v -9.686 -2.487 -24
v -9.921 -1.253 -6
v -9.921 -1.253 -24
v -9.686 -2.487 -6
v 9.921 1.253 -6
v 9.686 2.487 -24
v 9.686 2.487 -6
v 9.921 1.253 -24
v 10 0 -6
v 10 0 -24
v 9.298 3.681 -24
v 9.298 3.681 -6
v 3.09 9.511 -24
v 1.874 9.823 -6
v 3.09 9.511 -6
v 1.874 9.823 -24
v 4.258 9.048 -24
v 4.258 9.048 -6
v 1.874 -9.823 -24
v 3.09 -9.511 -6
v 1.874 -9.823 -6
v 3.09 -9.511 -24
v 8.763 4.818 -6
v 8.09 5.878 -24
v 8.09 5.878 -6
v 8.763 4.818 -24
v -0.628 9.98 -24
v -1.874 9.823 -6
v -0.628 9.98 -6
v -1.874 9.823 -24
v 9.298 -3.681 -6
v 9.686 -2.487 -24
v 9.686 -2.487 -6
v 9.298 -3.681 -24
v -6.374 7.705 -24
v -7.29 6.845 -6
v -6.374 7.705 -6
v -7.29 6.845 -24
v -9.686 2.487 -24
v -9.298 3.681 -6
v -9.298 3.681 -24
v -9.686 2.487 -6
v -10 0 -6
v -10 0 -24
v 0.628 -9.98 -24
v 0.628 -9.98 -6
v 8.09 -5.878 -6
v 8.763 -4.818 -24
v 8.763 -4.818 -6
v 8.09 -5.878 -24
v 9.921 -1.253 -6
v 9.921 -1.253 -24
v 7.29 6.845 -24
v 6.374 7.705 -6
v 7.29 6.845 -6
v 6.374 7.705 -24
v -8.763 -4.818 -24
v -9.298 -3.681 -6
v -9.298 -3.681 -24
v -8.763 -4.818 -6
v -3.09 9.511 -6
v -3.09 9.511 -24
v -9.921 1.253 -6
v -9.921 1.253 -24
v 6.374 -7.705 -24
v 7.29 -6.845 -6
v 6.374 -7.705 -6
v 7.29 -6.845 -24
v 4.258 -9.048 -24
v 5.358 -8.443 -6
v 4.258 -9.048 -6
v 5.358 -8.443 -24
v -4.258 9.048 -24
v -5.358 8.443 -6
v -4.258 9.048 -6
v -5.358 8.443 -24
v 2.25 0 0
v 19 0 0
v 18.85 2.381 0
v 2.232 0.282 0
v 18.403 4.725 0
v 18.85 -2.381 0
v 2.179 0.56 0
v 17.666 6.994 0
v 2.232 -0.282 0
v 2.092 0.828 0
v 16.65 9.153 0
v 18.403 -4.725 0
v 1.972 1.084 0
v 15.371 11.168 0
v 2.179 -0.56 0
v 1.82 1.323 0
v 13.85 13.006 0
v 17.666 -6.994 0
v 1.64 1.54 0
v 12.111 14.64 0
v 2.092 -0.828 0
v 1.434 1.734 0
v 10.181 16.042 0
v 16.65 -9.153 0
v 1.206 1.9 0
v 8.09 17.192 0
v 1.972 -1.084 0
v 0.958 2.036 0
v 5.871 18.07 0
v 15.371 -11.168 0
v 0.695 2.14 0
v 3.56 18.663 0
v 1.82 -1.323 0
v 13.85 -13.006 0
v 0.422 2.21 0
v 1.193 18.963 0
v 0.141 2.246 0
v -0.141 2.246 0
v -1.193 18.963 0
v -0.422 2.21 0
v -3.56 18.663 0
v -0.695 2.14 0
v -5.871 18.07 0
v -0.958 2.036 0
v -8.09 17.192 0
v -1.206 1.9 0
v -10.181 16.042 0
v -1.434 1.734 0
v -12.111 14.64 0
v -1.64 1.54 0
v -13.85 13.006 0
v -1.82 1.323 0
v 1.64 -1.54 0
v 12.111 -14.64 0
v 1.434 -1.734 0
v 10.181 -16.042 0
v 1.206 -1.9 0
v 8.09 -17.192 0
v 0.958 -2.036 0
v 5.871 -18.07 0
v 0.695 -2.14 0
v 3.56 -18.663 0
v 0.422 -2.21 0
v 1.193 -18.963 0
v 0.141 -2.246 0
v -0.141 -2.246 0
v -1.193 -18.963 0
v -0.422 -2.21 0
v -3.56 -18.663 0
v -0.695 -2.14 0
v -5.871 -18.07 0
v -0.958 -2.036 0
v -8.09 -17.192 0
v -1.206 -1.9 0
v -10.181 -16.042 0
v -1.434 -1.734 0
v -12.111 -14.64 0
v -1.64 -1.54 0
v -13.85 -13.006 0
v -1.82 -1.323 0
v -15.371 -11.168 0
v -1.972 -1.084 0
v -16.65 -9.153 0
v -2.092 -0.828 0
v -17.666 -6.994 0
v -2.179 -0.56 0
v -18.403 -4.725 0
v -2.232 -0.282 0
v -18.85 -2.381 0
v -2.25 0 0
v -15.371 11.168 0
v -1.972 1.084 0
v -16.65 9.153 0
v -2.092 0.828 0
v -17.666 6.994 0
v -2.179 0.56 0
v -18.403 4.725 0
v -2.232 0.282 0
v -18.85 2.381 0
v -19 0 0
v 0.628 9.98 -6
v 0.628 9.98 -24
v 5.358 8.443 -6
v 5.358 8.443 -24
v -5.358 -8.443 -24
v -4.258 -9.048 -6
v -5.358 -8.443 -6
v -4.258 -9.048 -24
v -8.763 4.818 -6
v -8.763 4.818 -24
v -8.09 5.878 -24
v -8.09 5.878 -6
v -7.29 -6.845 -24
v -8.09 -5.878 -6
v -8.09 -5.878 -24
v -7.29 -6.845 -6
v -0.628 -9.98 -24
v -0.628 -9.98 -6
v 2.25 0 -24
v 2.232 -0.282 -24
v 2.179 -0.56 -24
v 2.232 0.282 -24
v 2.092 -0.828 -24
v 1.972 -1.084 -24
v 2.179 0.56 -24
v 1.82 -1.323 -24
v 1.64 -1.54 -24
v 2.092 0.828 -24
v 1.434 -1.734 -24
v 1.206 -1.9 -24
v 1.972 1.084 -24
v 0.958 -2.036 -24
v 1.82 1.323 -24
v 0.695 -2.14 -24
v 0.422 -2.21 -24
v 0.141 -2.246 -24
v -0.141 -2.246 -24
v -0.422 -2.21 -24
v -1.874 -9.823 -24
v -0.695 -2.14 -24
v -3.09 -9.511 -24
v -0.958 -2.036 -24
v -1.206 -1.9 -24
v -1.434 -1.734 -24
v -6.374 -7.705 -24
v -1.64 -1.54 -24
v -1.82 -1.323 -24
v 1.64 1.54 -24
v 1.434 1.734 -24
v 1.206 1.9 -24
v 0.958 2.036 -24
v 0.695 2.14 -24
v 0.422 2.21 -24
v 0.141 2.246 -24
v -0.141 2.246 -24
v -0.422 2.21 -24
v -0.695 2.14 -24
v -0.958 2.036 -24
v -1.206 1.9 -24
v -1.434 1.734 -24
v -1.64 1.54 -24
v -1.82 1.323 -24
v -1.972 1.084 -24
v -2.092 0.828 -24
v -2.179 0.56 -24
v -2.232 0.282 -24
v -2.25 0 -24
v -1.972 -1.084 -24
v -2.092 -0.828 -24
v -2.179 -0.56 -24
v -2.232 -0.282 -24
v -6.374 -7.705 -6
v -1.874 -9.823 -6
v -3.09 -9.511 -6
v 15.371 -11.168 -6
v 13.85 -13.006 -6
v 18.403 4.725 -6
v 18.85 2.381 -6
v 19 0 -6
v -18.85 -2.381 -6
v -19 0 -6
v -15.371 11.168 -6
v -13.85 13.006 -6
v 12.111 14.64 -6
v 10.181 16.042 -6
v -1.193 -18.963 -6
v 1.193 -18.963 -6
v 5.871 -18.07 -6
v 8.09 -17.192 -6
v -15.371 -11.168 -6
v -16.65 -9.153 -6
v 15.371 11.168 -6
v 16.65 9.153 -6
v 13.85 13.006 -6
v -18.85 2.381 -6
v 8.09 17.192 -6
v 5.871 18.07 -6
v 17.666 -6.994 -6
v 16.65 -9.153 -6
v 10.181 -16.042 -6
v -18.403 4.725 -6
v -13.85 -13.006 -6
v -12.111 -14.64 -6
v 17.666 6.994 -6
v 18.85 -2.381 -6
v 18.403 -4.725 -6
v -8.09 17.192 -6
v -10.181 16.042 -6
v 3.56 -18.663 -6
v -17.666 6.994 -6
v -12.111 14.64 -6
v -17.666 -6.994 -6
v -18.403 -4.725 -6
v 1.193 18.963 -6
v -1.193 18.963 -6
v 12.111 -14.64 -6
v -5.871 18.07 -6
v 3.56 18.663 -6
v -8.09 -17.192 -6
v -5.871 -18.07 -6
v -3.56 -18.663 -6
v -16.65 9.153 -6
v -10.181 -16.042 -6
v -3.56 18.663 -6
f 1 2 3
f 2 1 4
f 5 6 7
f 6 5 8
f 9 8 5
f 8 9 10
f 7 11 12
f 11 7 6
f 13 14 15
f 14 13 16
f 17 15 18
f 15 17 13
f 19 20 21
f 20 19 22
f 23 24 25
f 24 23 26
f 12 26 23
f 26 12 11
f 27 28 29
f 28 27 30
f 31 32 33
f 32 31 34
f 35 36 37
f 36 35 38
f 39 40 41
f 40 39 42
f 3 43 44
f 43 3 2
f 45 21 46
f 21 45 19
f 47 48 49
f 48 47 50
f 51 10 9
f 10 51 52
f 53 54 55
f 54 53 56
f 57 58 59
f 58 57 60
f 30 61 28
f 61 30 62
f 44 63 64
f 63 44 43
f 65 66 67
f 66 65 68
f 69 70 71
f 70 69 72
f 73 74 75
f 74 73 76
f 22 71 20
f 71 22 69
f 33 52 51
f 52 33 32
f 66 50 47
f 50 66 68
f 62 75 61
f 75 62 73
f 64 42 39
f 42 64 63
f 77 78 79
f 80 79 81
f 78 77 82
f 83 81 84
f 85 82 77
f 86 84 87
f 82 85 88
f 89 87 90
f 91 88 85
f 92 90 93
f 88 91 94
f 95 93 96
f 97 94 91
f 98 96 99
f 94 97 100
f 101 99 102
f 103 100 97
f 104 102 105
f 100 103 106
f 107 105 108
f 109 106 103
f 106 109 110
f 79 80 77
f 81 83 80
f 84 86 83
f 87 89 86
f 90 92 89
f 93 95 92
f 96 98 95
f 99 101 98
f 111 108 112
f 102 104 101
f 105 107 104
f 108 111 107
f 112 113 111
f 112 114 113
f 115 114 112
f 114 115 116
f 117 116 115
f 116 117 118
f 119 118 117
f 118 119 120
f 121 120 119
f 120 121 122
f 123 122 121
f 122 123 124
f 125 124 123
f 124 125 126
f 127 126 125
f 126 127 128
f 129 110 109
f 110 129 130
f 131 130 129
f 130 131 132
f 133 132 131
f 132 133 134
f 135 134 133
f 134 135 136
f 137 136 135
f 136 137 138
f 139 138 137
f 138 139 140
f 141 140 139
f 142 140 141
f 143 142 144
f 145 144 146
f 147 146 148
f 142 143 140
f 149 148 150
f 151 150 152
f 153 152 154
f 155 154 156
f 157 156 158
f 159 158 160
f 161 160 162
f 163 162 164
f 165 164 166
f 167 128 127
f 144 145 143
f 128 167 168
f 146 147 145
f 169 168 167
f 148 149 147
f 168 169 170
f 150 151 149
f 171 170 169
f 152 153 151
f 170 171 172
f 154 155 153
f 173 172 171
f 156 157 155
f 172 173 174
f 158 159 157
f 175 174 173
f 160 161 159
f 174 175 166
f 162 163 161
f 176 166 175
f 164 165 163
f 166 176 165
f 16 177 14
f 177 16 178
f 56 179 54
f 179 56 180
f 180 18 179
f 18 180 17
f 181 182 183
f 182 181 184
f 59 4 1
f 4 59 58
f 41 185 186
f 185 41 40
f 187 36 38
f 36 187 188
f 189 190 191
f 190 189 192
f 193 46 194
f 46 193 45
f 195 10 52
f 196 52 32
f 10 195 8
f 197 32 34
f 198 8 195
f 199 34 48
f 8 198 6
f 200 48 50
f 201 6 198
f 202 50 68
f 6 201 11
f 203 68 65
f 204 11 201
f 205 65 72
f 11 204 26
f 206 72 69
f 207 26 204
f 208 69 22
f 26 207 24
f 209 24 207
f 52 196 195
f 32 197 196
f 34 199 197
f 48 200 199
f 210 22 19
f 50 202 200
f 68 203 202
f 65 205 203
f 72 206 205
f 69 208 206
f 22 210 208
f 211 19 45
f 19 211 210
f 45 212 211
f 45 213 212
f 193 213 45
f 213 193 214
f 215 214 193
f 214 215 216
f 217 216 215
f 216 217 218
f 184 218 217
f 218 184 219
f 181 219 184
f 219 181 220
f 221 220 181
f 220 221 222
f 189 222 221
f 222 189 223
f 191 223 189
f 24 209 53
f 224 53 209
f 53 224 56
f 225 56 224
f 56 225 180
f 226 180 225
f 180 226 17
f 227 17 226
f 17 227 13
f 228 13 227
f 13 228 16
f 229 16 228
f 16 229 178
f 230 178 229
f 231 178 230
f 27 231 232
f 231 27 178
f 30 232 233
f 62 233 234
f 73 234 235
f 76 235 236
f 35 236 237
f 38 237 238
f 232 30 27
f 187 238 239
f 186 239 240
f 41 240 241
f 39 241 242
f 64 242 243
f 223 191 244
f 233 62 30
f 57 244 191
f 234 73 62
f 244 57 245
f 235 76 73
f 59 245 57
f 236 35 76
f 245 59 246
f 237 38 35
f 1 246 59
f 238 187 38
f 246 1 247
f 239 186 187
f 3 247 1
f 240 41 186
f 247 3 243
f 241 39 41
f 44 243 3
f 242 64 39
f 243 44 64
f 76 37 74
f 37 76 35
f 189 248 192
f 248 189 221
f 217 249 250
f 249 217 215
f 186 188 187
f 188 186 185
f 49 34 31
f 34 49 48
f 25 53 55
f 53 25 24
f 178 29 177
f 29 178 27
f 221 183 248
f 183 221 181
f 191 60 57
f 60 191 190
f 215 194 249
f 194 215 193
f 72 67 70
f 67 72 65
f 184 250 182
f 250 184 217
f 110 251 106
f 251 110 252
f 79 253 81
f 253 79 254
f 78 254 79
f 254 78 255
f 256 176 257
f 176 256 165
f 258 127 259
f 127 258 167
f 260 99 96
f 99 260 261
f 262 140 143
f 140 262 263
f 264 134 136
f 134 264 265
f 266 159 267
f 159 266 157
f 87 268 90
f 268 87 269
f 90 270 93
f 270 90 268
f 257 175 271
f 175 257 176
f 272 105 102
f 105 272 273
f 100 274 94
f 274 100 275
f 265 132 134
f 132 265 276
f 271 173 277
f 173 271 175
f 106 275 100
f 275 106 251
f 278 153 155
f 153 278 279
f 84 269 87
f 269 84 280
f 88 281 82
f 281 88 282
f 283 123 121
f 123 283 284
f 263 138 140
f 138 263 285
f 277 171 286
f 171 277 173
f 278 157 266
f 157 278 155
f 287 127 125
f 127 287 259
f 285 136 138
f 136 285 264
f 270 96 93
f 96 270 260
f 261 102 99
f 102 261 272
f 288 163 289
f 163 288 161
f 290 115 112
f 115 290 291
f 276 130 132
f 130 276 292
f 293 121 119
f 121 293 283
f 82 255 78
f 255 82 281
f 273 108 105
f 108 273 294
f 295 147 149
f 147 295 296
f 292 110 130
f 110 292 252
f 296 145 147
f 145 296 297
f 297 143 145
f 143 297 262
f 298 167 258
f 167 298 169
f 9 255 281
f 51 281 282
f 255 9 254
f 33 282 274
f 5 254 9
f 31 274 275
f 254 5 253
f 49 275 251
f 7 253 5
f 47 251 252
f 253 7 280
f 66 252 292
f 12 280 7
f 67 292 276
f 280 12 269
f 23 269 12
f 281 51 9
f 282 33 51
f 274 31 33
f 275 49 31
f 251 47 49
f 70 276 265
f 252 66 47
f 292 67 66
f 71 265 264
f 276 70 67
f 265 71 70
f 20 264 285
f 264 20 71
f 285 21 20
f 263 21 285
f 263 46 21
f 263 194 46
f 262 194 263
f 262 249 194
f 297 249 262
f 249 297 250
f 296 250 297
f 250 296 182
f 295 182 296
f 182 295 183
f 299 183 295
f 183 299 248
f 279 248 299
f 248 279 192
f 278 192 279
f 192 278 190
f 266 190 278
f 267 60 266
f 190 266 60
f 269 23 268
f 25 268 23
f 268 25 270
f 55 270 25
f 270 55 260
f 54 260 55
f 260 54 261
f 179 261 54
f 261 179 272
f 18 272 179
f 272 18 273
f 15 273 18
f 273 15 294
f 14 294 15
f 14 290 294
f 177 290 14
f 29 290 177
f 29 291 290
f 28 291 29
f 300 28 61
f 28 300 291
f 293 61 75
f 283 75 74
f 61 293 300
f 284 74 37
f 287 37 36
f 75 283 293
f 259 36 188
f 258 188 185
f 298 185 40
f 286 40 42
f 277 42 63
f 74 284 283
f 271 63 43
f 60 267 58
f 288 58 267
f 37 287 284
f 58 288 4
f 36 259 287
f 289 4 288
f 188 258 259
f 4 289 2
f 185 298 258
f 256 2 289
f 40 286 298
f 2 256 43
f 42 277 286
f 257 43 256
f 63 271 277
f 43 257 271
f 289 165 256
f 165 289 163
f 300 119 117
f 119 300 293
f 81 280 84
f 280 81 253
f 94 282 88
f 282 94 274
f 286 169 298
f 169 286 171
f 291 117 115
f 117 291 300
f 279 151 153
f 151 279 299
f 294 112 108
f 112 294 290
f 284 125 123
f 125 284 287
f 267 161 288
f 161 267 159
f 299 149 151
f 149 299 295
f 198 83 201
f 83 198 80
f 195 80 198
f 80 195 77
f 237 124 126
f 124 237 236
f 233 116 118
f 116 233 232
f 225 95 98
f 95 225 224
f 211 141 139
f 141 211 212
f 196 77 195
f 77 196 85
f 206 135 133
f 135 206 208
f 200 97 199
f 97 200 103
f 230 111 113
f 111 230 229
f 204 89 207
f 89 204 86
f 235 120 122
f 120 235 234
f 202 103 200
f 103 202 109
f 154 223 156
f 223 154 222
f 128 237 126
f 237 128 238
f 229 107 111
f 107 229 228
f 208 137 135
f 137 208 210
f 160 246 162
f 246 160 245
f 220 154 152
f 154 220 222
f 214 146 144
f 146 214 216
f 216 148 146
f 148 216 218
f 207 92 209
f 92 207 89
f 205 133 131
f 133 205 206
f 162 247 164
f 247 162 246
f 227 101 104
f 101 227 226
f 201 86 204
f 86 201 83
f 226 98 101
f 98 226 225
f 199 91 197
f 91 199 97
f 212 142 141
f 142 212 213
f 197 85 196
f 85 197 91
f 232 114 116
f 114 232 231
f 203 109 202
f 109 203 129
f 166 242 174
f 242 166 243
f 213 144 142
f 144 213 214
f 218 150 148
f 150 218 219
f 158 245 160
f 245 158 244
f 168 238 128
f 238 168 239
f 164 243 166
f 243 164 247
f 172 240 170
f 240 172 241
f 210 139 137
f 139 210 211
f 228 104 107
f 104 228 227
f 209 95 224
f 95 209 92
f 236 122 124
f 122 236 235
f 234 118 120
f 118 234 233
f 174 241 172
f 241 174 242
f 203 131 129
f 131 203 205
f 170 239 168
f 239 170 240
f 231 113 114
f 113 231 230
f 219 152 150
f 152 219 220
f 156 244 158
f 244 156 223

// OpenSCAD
$fn = 50;


difference() {
	union() {
		translate(v = [0, 0, -24.0000000000]) {
			cylinder(h = 24, r = 10.0000000000);
		}
		translate(v = [0, 0, -6.0000000000]) {
			cylinder(h = 6, r = 19.0000000000);
		}
	}
	union() {
		#translate(v = [0, 0, -24]) {
			cylinder(h = 24, r = 2.2500000000);
		}
	}
}
